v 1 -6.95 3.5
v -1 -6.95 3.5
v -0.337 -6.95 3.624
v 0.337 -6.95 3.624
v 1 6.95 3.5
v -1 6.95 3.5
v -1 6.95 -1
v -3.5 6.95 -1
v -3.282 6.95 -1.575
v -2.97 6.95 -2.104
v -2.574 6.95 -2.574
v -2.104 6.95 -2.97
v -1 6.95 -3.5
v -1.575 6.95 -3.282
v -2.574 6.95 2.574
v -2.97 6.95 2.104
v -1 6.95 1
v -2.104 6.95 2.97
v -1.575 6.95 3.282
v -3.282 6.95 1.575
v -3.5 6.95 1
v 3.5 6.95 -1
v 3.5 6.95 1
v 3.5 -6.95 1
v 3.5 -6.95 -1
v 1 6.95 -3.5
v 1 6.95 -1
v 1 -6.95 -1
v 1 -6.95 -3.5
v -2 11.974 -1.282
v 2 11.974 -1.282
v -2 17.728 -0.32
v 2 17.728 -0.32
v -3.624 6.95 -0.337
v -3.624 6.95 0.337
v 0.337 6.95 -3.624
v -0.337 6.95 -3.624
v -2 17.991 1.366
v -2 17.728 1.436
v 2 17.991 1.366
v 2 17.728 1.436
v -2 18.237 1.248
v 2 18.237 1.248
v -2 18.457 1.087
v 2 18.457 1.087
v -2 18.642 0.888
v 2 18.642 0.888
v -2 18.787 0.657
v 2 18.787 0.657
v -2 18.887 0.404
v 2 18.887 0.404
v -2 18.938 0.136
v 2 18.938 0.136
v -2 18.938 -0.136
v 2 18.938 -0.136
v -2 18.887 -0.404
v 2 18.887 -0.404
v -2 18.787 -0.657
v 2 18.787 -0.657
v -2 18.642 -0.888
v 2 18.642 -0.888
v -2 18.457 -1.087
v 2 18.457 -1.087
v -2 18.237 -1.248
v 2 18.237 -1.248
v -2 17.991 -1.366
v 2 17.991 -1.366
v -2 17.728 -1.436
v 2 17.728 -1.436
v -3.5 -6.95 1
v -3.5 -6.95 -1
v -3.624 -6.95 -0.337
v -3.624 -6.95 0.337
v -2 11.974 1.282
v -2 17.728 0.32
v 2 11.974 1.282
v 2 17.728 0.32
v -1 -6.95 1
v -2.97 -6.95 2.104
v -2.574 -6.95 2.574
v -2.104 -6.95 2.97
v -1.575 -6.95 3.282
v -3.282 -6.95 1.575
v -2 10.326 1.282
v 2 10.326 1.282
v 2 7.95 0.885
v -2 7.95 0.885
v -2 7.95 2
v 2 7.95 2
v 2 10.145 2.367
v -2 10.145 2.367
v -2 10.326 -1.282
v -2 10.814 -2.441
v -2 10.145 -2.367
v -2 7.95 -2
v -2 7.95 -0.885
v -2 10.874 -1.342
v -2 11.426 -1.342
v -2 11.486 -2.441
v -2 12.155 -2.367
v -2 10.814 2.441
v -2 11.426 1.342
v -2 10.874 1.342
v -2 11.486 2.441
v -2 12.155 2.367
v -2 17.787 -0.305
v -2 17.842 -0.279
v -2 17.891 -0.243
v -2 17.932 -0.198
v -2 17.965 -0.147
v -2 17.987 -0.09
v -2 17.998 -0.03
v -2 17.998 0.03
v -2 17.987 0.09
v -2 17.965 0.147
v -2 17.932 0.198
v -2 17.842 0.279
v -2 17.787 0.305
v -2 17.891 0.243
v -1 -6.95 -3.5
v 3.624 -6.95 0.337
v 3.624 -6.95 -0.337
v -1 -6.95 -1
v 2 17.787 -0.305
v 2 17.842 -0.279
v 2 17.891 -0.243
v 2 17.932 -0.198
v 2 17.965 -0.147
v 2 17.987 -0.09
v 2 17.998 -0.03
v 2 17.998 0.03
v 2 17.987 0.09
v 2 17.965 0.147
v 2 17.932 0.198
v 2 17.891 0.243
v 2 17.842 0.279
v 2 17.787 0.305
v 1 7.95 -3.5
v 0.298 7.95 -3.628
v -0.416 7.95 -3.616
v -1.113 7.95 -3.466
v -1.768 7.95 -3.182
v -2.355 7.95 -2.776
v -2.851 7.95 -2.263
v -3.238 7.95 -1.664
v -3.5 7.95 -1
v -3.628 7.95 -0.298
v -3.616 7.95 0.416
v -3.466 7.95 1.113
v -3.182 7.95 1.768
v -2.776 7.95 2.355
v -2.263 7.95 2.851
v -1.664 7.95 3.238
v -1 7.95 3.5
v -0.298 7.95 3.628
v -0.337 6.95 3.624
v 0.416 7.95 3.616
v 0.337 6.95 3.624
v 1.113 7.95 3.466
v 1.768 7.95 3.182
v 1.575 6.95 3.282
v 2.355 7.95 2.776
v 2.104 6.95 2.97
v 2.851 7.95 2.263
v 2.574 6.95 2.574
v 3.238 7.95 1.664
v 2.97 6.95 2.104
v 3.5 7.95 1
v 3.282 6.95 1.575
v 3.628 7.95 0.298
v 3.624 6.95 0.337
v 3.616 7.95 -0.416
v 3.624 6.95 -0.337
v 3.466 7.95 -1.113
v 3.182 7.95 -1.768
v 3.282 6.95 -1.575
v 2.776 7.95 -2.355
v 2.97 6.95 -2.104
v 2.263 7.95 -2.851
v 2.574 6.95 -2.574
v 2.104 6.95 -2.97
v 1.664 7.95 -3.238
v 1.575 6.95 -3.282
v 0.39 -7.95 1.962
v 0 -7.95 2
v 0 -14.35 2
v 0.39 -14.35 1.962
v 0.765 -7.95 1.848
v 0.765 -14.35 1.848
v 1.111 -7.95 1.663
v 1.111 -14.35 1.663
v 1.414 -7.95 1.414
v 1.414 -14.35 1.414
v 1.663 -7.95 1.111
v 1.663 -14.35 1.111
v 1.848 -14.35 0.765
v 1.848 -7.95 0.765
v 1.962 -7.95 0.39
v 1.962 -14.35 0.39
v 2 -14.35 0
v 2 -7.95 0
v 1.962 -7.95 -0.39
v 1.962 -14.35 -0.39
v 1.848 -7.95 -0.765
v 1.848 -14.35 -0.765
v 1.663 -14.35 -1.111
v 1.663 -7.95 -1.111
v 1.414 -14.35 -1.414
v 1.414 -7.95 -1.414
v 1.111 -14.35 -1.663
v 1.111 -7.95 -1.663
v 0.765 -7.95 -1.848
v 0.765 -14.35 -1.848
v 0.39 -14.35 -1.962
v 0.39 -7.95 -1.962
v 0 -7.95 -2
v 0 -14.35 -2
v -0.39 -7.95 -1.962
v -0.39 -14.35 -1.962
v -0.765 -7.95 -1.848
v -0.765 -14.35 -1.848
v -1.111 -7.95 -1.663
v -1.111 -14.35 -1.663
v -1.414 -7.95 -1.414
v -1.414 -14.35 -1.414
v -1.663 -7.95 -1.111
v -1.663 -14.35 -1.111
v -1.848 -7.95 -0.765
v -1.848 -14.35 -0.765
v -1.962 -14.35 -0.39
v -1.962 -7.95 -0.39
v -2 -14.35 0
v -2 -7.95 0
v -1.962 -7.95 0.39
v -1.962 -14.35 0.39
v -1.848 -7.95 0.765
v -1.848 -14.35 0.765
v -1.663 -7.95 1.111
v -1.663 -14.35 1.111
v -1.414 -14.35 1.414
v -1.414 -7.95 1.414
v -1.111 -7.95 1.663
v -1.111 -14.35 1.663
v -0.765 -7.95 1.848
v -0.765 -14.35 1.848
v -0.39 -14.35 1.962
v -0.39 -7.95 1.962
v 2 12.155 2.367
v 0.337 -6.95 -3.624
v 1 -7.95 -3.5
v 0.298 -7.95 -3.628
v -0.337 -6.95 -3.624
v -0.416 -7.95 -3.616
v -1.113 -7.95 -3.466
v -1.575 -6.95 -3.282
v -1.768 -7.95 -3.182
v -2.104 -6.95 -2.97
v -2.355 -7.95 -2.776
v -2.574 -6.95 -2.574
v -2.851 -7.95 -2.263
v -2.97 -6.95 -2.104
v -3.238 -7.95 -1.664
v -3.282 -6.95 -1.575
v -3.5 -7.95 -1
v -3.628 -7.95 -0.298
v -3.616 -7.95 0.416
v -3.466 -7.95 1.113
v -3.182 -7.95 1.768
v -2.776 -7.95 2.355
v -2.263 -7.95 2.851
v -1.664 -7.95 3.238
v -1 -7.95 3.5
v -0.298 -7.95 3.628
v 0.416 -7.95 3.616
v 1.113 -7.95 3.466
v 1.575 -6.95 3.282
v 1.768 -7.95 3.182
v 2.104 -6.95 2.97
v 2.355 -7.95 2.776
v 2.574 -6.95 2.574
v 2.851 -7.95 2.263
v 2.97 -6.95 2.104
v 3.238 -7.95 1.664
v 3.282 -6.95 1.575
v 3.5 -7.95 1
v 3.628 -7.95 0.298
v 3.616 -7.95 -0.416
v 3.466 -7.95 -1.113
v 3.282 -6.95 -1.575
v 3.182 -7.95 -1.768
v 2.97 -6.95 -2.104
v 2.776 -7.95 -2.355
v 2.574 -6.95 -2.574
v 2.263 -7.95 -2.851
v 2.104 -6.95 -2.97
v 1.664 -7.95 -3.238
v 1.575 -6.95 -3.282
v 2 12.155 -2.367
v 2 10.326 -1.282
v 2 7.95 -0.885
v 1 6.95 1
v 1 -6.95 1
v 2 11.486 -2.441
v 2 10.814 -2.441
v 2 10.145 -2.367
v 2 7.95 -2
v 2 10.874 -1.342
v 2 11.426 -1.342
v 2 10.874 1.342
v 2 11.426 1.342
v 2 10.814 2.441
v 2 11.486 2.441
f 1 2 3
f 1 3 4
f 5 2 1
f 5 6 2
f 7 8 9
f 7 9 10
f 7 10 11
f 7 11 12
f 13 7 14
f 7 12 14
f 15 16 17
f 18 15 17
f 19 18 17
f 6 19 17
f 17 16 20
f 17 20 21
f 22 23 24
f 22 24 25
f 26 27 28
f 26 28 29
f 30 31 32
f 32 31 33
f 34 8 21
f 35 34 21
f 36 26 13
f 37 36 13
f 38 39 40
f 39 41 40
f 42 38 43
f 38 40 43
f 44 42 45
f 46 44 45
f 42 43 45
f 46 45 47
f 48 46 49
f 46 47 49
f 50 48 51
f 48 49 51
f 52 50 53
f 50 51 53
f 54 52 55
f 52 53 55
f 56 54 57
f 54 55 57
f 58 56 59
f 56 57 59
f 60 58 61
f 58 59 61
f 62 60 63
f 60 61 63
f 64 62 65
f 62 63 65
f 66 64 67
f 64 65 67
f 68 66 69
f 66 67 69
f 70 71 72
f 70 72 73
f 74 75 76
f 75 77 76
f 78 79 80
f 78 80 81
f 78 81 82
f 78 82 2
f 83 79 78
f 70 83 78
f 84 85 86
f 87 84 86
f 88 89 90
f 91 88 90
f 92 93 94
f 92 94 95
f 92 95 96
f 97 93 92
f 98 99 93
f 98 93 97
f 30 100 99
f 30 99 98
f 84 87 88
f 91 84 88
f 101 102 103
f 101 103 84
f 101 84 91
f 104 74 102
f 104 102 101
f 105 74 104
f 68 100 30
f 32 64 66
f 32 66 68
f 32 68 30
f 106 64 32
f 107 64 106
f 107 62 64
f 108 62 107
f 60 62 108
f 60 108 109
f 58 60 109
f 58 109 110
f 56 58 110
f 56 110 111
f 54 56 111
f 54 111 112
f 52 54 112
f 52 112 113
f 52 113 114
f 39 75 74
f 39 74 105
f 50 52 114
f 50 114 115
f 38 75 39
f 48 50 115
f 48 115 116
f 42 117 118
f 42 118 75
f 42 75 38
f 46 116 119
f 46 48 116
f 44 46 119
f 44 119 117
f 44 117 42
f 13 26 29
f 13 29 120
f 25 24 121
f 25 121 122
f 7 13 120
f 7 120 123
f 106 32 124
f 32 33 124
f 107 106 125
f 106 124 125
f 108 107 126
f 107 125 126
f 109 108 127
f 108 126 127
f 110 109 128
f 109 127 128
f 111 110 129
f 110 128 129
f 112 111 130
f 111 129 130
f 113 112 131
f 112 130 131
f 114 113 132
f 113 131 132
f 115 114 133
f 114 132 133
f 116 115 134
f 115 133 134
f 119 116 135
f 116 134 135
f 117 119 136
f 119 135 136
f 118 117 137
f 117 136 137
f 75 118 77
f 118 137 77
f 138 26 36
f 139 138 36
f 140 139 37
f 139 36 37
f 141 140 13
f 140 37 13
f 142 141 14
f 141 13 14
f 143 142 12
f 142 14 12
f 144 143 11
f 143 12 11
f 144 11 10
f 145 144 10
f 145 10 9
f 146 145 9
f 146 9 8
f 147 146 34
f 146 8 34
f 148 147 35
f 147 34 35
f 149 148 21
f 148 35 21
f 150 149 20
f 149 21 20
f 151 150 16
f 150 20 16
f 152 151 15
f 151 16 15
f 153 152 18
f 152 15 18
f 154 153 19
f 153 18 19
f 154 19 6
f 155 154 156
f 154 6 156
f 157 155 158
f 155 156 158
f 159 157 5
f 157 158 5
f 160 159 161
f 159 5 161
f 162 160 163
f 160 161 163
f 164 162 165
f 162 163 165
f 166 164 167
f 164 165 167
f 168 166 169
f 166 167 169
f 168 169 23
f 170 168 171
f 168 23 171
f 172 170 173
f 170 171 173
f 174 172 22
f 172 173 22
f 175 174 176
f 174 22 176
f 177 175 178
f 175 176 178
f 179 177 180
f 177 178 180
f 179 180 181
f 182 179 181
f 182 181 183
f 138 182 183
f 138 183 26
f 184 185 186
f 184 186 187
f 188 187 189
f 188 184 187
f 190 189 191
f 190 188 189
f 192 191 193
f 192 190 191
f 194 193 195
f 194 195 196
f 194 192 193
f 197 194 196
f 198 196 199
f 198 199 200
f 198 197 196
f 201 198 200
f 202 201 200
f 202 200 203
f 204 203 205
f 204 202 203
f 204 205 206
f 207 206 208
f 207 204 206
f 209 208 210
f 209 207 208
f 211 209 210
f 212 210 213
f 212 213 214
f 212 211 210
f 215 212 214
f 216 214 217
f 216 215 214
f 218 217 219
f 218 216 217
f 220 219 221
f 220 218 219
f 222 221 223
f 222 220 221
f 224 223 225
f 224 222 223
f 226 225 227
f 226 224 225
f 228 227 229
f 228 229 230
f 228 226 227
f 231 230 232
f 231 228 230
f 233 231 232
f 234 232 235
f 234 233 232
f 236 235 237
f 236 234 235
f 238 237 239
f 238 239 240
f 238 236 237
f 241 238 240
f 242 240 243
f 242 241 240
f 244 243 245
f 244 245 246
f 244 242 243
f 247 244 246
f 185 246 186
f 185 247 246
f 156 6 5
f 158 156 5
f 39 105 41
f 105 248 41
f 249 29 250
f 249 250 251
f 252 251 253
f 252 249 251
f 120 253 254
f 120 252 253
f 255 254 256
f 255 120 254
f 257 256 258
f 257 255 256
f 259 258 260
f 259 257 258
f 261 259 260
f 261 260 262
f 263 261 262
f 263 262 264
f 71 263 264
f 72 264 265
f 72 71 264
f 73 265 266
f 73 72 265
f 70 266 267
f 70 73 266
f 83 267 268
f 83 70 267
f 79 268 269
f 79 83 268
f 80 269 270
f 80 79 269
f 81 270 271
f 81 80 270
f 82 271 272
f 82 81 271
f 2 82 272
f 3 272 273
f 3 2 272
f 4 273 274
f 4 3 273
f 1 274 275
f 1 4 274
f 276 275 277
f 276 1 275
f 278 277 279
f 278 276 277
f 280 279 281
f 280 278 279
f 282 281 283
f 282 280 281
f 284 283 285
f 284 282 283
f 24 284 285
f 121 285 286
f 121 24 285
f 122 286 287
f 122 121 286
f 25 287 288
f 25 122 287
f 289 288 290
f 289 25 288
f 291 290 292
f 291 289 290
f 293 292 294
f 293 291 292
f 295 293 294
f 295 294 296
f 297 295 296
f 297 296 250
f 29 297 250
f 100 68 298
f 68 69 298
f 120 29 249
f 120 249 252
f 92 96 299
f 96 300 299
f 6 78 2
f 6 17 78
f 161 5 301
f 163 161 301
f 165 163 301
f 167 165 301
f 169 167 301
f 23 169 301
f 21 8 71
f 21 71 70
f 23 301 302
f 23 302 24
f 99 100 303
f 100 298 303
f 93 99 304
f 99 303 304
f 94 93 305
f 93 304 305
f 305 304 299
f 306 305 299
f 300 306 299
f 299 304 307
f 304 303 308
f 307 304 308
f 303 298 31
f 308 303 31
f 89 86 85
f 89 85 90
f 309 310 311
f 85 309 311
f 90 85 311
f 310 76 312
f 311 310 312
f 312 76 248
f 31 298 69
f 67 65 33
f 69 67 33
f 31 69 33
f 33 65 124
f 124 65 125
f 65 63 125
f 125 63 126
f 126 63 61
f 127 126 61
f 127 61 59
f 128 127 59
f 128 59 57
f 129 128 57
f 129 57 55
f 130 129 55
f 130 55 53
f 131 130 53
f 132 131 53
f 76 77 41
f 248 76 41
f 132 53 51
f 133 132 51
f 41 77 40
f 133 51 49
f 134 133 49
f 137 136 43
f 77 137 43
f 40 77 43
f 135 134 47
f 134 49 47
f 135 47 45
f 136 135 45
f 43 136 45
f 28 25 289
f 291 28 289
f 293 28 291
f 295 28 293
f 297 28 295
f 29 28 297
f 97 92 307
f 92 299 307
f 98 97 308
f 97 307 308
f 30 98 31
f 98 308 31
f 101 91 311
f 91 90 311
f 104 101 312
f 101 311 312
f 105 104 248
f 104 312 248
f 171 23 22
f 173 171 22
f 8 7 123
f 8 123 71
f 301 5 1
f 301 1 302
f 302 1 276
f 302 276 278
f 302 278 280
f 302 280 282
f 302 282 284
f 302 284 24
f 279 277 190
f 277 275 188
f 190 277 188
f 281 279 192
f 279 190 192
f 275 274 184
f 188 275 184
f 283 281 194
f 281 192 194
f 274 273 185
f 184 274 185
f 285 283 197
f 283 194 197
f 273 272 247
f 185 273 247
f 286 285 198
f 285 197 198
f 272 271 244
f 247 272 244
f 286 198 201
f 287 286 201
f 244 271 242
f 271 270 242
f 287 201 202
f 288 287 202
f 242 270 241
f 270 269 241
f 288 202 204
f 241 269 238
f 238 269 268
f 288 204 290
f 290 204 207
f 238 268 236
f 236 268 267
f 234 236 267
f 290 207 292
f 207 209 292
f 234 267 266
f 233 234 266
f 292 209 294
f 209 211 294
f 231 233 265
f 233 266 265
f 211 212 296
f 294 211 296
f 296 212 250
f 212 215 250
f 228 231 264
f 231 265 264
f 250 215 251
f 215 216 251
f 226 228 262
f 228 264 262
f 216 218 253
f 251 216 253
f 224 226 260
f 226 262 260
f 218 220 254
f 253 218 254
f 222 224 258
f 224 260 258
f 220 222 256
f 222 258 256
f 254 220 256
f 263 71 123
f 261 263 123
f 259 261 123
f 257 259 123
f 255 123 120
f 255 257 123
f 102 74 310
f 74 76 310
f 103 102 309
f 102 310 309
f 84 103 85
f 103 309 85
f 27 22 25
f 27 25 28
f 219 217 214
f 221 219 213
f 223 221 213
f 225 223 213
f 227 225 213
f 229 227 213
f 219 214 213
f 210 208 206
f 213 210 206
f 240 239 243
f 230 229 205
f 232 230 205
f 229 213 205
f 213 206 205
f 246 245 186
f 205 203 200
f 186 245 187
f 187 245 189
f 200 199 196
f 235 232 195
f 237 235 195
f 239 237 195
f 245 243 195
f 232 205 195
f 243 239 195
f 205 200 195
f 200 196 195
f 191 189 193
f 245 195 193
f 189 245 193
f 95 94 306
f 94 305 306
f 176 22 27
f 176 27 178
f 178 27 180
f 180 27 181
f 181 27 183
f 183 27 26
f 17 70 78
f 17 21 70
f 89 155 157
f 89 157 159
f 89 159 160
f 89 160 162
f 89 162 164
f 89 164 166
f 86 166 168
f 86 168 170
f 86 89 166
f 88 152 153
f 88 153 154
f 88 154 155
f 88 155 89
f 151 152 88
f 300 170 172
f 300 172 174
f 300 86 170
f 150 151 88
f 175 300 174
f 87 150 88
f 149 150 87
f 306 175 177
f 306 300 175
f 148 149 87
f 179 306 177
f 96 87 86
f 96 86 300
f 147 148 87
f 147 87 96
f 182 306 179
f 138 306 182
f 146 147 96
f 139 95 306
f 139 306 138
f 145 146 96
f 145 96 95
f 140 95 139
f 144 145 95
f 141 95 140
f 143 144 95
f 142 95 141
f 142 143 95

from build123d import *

# Parameters (mm, degrees)
BOSS_EXTRUDE1_DEPTH = 6.95
SKETCH2_R           = 3.640054945
BOSS_EXTRUDE2_DEPTH = 1
SKETCH3_R           = 2
BOSS_EXTRUDE4_DEPTH = 6.4
BOSS_EXTRUDE5_DEPTH = 2


with BuildPart() as part:
    # Sketch1 → Boss-Extrude1 (new, symmetric)
    with BuildSketch(Plane(origin=(0, 0, 0), x_dir=(1, 0, 0), z_dir=(0, 1, 0))):
        Polygon((-1, -3.5), (1, -3.5), (1, -1), (3.5, -1), (3.5, 1), (1, 1), (1, 3.5), (-1, 3.5), (-1, 1), (-3.5, 1), (-3.5, -1), (-1, -1), align=None)
    extrude(amount=BOSS_EXTRUDE1_DEPTH, both=True)

    # Sketch2 → Boss-Extrude2 (add)
    with BuildSketch(Plane(origin=(0, 6.95, 0), x_dir=(1, 0, 0), z_dir=(0, 1, 0))):
        with Locations(Location((0, 0, 0), (0, 0, 74.054604099))):
            Circle(SKETCH2_R)
    boss_extrude2 = extrude(amount=BOSS_EXTRUDE2_DEPTH)

    # Mirror1: Boss-Extrude2 across plane
    add(boss_extrude2.mirror(Plane.ZX))

    # Sketch3 → Boss-Extrude4 (add)
    with BuildSketch(Plane(origin=(0, -7.95, 0), x_dir=(1, 0, 0), z_dir=(0, 1, 0))):
        with Locations(Location((0, 0, 0), (0, 0, 270))):
            Circle(SKETCH3_R)
    extrude(amount=-BOSS_EXTRUDE4_DEPTH)

    # Sketch6 → Boss-Extrude5 (add, symmetric)
    with BuildSketch(Plane(origin=(0, 0, 0), x_dir=(0, 0, -1), z_dir=(1, 0, 0))):
        with BuildLine():
            Line((-2, 7.95), (-2.366643319, 10.14501086))
            ThreePointArc((-2.366643319, 10.14501086), (-2.45, 11.15), (-2.366643319, 12.15498914))
            Line((-2.366643319, 12.15498914), (-1.435716028, 17.728240876))
            ThreePointArc((-1.435716028, 17.728240876), (0, 18.944033198), (1.435716028, 17.728240876))
            Line((1.435716028, 17.728240876), (2.366643319, 12.15498914))
            ThreePointArc((2.366643319, 12.15498914), (2.45, 11.15), (2.366643319, 10.14501086))
            Line((2.366643319, 10.14501086), (2, 7.95))
            Line((2, 7.95), (0.884760215, 7.95))
            Line((0.884760215, 7.95), (1.281674852, 10.32623841))
            ThreePointArc((1.281674852, 10.32623841), (1.35, 11.15), (1.281674852, 11.97376159))
            Line((1.281674852, 11.97376159), (0.320476243, 17.728240876))
            ThreePointArc((0.320476243, 17.728240876), (0, 17.999626406), (-0.320476243, 17.728240876))
            Line((-0.320476243, 17.728240876), (-1.281674852, 11.97376159))
            ThreePointArc((-1.281674852, 11.97376159), (-1.35, 11.15), (-1.281674852, 10.32623841))
            Line((-1.281674852, 10.32623841), (-0.884760215, 7.95))
            Line((-0.884760215, 7.95), (-2, 7.95))
        make_face()
    extrude(amount=BOSS_EXTRUDE5_DEPTH, both=True)


solid = part.part
